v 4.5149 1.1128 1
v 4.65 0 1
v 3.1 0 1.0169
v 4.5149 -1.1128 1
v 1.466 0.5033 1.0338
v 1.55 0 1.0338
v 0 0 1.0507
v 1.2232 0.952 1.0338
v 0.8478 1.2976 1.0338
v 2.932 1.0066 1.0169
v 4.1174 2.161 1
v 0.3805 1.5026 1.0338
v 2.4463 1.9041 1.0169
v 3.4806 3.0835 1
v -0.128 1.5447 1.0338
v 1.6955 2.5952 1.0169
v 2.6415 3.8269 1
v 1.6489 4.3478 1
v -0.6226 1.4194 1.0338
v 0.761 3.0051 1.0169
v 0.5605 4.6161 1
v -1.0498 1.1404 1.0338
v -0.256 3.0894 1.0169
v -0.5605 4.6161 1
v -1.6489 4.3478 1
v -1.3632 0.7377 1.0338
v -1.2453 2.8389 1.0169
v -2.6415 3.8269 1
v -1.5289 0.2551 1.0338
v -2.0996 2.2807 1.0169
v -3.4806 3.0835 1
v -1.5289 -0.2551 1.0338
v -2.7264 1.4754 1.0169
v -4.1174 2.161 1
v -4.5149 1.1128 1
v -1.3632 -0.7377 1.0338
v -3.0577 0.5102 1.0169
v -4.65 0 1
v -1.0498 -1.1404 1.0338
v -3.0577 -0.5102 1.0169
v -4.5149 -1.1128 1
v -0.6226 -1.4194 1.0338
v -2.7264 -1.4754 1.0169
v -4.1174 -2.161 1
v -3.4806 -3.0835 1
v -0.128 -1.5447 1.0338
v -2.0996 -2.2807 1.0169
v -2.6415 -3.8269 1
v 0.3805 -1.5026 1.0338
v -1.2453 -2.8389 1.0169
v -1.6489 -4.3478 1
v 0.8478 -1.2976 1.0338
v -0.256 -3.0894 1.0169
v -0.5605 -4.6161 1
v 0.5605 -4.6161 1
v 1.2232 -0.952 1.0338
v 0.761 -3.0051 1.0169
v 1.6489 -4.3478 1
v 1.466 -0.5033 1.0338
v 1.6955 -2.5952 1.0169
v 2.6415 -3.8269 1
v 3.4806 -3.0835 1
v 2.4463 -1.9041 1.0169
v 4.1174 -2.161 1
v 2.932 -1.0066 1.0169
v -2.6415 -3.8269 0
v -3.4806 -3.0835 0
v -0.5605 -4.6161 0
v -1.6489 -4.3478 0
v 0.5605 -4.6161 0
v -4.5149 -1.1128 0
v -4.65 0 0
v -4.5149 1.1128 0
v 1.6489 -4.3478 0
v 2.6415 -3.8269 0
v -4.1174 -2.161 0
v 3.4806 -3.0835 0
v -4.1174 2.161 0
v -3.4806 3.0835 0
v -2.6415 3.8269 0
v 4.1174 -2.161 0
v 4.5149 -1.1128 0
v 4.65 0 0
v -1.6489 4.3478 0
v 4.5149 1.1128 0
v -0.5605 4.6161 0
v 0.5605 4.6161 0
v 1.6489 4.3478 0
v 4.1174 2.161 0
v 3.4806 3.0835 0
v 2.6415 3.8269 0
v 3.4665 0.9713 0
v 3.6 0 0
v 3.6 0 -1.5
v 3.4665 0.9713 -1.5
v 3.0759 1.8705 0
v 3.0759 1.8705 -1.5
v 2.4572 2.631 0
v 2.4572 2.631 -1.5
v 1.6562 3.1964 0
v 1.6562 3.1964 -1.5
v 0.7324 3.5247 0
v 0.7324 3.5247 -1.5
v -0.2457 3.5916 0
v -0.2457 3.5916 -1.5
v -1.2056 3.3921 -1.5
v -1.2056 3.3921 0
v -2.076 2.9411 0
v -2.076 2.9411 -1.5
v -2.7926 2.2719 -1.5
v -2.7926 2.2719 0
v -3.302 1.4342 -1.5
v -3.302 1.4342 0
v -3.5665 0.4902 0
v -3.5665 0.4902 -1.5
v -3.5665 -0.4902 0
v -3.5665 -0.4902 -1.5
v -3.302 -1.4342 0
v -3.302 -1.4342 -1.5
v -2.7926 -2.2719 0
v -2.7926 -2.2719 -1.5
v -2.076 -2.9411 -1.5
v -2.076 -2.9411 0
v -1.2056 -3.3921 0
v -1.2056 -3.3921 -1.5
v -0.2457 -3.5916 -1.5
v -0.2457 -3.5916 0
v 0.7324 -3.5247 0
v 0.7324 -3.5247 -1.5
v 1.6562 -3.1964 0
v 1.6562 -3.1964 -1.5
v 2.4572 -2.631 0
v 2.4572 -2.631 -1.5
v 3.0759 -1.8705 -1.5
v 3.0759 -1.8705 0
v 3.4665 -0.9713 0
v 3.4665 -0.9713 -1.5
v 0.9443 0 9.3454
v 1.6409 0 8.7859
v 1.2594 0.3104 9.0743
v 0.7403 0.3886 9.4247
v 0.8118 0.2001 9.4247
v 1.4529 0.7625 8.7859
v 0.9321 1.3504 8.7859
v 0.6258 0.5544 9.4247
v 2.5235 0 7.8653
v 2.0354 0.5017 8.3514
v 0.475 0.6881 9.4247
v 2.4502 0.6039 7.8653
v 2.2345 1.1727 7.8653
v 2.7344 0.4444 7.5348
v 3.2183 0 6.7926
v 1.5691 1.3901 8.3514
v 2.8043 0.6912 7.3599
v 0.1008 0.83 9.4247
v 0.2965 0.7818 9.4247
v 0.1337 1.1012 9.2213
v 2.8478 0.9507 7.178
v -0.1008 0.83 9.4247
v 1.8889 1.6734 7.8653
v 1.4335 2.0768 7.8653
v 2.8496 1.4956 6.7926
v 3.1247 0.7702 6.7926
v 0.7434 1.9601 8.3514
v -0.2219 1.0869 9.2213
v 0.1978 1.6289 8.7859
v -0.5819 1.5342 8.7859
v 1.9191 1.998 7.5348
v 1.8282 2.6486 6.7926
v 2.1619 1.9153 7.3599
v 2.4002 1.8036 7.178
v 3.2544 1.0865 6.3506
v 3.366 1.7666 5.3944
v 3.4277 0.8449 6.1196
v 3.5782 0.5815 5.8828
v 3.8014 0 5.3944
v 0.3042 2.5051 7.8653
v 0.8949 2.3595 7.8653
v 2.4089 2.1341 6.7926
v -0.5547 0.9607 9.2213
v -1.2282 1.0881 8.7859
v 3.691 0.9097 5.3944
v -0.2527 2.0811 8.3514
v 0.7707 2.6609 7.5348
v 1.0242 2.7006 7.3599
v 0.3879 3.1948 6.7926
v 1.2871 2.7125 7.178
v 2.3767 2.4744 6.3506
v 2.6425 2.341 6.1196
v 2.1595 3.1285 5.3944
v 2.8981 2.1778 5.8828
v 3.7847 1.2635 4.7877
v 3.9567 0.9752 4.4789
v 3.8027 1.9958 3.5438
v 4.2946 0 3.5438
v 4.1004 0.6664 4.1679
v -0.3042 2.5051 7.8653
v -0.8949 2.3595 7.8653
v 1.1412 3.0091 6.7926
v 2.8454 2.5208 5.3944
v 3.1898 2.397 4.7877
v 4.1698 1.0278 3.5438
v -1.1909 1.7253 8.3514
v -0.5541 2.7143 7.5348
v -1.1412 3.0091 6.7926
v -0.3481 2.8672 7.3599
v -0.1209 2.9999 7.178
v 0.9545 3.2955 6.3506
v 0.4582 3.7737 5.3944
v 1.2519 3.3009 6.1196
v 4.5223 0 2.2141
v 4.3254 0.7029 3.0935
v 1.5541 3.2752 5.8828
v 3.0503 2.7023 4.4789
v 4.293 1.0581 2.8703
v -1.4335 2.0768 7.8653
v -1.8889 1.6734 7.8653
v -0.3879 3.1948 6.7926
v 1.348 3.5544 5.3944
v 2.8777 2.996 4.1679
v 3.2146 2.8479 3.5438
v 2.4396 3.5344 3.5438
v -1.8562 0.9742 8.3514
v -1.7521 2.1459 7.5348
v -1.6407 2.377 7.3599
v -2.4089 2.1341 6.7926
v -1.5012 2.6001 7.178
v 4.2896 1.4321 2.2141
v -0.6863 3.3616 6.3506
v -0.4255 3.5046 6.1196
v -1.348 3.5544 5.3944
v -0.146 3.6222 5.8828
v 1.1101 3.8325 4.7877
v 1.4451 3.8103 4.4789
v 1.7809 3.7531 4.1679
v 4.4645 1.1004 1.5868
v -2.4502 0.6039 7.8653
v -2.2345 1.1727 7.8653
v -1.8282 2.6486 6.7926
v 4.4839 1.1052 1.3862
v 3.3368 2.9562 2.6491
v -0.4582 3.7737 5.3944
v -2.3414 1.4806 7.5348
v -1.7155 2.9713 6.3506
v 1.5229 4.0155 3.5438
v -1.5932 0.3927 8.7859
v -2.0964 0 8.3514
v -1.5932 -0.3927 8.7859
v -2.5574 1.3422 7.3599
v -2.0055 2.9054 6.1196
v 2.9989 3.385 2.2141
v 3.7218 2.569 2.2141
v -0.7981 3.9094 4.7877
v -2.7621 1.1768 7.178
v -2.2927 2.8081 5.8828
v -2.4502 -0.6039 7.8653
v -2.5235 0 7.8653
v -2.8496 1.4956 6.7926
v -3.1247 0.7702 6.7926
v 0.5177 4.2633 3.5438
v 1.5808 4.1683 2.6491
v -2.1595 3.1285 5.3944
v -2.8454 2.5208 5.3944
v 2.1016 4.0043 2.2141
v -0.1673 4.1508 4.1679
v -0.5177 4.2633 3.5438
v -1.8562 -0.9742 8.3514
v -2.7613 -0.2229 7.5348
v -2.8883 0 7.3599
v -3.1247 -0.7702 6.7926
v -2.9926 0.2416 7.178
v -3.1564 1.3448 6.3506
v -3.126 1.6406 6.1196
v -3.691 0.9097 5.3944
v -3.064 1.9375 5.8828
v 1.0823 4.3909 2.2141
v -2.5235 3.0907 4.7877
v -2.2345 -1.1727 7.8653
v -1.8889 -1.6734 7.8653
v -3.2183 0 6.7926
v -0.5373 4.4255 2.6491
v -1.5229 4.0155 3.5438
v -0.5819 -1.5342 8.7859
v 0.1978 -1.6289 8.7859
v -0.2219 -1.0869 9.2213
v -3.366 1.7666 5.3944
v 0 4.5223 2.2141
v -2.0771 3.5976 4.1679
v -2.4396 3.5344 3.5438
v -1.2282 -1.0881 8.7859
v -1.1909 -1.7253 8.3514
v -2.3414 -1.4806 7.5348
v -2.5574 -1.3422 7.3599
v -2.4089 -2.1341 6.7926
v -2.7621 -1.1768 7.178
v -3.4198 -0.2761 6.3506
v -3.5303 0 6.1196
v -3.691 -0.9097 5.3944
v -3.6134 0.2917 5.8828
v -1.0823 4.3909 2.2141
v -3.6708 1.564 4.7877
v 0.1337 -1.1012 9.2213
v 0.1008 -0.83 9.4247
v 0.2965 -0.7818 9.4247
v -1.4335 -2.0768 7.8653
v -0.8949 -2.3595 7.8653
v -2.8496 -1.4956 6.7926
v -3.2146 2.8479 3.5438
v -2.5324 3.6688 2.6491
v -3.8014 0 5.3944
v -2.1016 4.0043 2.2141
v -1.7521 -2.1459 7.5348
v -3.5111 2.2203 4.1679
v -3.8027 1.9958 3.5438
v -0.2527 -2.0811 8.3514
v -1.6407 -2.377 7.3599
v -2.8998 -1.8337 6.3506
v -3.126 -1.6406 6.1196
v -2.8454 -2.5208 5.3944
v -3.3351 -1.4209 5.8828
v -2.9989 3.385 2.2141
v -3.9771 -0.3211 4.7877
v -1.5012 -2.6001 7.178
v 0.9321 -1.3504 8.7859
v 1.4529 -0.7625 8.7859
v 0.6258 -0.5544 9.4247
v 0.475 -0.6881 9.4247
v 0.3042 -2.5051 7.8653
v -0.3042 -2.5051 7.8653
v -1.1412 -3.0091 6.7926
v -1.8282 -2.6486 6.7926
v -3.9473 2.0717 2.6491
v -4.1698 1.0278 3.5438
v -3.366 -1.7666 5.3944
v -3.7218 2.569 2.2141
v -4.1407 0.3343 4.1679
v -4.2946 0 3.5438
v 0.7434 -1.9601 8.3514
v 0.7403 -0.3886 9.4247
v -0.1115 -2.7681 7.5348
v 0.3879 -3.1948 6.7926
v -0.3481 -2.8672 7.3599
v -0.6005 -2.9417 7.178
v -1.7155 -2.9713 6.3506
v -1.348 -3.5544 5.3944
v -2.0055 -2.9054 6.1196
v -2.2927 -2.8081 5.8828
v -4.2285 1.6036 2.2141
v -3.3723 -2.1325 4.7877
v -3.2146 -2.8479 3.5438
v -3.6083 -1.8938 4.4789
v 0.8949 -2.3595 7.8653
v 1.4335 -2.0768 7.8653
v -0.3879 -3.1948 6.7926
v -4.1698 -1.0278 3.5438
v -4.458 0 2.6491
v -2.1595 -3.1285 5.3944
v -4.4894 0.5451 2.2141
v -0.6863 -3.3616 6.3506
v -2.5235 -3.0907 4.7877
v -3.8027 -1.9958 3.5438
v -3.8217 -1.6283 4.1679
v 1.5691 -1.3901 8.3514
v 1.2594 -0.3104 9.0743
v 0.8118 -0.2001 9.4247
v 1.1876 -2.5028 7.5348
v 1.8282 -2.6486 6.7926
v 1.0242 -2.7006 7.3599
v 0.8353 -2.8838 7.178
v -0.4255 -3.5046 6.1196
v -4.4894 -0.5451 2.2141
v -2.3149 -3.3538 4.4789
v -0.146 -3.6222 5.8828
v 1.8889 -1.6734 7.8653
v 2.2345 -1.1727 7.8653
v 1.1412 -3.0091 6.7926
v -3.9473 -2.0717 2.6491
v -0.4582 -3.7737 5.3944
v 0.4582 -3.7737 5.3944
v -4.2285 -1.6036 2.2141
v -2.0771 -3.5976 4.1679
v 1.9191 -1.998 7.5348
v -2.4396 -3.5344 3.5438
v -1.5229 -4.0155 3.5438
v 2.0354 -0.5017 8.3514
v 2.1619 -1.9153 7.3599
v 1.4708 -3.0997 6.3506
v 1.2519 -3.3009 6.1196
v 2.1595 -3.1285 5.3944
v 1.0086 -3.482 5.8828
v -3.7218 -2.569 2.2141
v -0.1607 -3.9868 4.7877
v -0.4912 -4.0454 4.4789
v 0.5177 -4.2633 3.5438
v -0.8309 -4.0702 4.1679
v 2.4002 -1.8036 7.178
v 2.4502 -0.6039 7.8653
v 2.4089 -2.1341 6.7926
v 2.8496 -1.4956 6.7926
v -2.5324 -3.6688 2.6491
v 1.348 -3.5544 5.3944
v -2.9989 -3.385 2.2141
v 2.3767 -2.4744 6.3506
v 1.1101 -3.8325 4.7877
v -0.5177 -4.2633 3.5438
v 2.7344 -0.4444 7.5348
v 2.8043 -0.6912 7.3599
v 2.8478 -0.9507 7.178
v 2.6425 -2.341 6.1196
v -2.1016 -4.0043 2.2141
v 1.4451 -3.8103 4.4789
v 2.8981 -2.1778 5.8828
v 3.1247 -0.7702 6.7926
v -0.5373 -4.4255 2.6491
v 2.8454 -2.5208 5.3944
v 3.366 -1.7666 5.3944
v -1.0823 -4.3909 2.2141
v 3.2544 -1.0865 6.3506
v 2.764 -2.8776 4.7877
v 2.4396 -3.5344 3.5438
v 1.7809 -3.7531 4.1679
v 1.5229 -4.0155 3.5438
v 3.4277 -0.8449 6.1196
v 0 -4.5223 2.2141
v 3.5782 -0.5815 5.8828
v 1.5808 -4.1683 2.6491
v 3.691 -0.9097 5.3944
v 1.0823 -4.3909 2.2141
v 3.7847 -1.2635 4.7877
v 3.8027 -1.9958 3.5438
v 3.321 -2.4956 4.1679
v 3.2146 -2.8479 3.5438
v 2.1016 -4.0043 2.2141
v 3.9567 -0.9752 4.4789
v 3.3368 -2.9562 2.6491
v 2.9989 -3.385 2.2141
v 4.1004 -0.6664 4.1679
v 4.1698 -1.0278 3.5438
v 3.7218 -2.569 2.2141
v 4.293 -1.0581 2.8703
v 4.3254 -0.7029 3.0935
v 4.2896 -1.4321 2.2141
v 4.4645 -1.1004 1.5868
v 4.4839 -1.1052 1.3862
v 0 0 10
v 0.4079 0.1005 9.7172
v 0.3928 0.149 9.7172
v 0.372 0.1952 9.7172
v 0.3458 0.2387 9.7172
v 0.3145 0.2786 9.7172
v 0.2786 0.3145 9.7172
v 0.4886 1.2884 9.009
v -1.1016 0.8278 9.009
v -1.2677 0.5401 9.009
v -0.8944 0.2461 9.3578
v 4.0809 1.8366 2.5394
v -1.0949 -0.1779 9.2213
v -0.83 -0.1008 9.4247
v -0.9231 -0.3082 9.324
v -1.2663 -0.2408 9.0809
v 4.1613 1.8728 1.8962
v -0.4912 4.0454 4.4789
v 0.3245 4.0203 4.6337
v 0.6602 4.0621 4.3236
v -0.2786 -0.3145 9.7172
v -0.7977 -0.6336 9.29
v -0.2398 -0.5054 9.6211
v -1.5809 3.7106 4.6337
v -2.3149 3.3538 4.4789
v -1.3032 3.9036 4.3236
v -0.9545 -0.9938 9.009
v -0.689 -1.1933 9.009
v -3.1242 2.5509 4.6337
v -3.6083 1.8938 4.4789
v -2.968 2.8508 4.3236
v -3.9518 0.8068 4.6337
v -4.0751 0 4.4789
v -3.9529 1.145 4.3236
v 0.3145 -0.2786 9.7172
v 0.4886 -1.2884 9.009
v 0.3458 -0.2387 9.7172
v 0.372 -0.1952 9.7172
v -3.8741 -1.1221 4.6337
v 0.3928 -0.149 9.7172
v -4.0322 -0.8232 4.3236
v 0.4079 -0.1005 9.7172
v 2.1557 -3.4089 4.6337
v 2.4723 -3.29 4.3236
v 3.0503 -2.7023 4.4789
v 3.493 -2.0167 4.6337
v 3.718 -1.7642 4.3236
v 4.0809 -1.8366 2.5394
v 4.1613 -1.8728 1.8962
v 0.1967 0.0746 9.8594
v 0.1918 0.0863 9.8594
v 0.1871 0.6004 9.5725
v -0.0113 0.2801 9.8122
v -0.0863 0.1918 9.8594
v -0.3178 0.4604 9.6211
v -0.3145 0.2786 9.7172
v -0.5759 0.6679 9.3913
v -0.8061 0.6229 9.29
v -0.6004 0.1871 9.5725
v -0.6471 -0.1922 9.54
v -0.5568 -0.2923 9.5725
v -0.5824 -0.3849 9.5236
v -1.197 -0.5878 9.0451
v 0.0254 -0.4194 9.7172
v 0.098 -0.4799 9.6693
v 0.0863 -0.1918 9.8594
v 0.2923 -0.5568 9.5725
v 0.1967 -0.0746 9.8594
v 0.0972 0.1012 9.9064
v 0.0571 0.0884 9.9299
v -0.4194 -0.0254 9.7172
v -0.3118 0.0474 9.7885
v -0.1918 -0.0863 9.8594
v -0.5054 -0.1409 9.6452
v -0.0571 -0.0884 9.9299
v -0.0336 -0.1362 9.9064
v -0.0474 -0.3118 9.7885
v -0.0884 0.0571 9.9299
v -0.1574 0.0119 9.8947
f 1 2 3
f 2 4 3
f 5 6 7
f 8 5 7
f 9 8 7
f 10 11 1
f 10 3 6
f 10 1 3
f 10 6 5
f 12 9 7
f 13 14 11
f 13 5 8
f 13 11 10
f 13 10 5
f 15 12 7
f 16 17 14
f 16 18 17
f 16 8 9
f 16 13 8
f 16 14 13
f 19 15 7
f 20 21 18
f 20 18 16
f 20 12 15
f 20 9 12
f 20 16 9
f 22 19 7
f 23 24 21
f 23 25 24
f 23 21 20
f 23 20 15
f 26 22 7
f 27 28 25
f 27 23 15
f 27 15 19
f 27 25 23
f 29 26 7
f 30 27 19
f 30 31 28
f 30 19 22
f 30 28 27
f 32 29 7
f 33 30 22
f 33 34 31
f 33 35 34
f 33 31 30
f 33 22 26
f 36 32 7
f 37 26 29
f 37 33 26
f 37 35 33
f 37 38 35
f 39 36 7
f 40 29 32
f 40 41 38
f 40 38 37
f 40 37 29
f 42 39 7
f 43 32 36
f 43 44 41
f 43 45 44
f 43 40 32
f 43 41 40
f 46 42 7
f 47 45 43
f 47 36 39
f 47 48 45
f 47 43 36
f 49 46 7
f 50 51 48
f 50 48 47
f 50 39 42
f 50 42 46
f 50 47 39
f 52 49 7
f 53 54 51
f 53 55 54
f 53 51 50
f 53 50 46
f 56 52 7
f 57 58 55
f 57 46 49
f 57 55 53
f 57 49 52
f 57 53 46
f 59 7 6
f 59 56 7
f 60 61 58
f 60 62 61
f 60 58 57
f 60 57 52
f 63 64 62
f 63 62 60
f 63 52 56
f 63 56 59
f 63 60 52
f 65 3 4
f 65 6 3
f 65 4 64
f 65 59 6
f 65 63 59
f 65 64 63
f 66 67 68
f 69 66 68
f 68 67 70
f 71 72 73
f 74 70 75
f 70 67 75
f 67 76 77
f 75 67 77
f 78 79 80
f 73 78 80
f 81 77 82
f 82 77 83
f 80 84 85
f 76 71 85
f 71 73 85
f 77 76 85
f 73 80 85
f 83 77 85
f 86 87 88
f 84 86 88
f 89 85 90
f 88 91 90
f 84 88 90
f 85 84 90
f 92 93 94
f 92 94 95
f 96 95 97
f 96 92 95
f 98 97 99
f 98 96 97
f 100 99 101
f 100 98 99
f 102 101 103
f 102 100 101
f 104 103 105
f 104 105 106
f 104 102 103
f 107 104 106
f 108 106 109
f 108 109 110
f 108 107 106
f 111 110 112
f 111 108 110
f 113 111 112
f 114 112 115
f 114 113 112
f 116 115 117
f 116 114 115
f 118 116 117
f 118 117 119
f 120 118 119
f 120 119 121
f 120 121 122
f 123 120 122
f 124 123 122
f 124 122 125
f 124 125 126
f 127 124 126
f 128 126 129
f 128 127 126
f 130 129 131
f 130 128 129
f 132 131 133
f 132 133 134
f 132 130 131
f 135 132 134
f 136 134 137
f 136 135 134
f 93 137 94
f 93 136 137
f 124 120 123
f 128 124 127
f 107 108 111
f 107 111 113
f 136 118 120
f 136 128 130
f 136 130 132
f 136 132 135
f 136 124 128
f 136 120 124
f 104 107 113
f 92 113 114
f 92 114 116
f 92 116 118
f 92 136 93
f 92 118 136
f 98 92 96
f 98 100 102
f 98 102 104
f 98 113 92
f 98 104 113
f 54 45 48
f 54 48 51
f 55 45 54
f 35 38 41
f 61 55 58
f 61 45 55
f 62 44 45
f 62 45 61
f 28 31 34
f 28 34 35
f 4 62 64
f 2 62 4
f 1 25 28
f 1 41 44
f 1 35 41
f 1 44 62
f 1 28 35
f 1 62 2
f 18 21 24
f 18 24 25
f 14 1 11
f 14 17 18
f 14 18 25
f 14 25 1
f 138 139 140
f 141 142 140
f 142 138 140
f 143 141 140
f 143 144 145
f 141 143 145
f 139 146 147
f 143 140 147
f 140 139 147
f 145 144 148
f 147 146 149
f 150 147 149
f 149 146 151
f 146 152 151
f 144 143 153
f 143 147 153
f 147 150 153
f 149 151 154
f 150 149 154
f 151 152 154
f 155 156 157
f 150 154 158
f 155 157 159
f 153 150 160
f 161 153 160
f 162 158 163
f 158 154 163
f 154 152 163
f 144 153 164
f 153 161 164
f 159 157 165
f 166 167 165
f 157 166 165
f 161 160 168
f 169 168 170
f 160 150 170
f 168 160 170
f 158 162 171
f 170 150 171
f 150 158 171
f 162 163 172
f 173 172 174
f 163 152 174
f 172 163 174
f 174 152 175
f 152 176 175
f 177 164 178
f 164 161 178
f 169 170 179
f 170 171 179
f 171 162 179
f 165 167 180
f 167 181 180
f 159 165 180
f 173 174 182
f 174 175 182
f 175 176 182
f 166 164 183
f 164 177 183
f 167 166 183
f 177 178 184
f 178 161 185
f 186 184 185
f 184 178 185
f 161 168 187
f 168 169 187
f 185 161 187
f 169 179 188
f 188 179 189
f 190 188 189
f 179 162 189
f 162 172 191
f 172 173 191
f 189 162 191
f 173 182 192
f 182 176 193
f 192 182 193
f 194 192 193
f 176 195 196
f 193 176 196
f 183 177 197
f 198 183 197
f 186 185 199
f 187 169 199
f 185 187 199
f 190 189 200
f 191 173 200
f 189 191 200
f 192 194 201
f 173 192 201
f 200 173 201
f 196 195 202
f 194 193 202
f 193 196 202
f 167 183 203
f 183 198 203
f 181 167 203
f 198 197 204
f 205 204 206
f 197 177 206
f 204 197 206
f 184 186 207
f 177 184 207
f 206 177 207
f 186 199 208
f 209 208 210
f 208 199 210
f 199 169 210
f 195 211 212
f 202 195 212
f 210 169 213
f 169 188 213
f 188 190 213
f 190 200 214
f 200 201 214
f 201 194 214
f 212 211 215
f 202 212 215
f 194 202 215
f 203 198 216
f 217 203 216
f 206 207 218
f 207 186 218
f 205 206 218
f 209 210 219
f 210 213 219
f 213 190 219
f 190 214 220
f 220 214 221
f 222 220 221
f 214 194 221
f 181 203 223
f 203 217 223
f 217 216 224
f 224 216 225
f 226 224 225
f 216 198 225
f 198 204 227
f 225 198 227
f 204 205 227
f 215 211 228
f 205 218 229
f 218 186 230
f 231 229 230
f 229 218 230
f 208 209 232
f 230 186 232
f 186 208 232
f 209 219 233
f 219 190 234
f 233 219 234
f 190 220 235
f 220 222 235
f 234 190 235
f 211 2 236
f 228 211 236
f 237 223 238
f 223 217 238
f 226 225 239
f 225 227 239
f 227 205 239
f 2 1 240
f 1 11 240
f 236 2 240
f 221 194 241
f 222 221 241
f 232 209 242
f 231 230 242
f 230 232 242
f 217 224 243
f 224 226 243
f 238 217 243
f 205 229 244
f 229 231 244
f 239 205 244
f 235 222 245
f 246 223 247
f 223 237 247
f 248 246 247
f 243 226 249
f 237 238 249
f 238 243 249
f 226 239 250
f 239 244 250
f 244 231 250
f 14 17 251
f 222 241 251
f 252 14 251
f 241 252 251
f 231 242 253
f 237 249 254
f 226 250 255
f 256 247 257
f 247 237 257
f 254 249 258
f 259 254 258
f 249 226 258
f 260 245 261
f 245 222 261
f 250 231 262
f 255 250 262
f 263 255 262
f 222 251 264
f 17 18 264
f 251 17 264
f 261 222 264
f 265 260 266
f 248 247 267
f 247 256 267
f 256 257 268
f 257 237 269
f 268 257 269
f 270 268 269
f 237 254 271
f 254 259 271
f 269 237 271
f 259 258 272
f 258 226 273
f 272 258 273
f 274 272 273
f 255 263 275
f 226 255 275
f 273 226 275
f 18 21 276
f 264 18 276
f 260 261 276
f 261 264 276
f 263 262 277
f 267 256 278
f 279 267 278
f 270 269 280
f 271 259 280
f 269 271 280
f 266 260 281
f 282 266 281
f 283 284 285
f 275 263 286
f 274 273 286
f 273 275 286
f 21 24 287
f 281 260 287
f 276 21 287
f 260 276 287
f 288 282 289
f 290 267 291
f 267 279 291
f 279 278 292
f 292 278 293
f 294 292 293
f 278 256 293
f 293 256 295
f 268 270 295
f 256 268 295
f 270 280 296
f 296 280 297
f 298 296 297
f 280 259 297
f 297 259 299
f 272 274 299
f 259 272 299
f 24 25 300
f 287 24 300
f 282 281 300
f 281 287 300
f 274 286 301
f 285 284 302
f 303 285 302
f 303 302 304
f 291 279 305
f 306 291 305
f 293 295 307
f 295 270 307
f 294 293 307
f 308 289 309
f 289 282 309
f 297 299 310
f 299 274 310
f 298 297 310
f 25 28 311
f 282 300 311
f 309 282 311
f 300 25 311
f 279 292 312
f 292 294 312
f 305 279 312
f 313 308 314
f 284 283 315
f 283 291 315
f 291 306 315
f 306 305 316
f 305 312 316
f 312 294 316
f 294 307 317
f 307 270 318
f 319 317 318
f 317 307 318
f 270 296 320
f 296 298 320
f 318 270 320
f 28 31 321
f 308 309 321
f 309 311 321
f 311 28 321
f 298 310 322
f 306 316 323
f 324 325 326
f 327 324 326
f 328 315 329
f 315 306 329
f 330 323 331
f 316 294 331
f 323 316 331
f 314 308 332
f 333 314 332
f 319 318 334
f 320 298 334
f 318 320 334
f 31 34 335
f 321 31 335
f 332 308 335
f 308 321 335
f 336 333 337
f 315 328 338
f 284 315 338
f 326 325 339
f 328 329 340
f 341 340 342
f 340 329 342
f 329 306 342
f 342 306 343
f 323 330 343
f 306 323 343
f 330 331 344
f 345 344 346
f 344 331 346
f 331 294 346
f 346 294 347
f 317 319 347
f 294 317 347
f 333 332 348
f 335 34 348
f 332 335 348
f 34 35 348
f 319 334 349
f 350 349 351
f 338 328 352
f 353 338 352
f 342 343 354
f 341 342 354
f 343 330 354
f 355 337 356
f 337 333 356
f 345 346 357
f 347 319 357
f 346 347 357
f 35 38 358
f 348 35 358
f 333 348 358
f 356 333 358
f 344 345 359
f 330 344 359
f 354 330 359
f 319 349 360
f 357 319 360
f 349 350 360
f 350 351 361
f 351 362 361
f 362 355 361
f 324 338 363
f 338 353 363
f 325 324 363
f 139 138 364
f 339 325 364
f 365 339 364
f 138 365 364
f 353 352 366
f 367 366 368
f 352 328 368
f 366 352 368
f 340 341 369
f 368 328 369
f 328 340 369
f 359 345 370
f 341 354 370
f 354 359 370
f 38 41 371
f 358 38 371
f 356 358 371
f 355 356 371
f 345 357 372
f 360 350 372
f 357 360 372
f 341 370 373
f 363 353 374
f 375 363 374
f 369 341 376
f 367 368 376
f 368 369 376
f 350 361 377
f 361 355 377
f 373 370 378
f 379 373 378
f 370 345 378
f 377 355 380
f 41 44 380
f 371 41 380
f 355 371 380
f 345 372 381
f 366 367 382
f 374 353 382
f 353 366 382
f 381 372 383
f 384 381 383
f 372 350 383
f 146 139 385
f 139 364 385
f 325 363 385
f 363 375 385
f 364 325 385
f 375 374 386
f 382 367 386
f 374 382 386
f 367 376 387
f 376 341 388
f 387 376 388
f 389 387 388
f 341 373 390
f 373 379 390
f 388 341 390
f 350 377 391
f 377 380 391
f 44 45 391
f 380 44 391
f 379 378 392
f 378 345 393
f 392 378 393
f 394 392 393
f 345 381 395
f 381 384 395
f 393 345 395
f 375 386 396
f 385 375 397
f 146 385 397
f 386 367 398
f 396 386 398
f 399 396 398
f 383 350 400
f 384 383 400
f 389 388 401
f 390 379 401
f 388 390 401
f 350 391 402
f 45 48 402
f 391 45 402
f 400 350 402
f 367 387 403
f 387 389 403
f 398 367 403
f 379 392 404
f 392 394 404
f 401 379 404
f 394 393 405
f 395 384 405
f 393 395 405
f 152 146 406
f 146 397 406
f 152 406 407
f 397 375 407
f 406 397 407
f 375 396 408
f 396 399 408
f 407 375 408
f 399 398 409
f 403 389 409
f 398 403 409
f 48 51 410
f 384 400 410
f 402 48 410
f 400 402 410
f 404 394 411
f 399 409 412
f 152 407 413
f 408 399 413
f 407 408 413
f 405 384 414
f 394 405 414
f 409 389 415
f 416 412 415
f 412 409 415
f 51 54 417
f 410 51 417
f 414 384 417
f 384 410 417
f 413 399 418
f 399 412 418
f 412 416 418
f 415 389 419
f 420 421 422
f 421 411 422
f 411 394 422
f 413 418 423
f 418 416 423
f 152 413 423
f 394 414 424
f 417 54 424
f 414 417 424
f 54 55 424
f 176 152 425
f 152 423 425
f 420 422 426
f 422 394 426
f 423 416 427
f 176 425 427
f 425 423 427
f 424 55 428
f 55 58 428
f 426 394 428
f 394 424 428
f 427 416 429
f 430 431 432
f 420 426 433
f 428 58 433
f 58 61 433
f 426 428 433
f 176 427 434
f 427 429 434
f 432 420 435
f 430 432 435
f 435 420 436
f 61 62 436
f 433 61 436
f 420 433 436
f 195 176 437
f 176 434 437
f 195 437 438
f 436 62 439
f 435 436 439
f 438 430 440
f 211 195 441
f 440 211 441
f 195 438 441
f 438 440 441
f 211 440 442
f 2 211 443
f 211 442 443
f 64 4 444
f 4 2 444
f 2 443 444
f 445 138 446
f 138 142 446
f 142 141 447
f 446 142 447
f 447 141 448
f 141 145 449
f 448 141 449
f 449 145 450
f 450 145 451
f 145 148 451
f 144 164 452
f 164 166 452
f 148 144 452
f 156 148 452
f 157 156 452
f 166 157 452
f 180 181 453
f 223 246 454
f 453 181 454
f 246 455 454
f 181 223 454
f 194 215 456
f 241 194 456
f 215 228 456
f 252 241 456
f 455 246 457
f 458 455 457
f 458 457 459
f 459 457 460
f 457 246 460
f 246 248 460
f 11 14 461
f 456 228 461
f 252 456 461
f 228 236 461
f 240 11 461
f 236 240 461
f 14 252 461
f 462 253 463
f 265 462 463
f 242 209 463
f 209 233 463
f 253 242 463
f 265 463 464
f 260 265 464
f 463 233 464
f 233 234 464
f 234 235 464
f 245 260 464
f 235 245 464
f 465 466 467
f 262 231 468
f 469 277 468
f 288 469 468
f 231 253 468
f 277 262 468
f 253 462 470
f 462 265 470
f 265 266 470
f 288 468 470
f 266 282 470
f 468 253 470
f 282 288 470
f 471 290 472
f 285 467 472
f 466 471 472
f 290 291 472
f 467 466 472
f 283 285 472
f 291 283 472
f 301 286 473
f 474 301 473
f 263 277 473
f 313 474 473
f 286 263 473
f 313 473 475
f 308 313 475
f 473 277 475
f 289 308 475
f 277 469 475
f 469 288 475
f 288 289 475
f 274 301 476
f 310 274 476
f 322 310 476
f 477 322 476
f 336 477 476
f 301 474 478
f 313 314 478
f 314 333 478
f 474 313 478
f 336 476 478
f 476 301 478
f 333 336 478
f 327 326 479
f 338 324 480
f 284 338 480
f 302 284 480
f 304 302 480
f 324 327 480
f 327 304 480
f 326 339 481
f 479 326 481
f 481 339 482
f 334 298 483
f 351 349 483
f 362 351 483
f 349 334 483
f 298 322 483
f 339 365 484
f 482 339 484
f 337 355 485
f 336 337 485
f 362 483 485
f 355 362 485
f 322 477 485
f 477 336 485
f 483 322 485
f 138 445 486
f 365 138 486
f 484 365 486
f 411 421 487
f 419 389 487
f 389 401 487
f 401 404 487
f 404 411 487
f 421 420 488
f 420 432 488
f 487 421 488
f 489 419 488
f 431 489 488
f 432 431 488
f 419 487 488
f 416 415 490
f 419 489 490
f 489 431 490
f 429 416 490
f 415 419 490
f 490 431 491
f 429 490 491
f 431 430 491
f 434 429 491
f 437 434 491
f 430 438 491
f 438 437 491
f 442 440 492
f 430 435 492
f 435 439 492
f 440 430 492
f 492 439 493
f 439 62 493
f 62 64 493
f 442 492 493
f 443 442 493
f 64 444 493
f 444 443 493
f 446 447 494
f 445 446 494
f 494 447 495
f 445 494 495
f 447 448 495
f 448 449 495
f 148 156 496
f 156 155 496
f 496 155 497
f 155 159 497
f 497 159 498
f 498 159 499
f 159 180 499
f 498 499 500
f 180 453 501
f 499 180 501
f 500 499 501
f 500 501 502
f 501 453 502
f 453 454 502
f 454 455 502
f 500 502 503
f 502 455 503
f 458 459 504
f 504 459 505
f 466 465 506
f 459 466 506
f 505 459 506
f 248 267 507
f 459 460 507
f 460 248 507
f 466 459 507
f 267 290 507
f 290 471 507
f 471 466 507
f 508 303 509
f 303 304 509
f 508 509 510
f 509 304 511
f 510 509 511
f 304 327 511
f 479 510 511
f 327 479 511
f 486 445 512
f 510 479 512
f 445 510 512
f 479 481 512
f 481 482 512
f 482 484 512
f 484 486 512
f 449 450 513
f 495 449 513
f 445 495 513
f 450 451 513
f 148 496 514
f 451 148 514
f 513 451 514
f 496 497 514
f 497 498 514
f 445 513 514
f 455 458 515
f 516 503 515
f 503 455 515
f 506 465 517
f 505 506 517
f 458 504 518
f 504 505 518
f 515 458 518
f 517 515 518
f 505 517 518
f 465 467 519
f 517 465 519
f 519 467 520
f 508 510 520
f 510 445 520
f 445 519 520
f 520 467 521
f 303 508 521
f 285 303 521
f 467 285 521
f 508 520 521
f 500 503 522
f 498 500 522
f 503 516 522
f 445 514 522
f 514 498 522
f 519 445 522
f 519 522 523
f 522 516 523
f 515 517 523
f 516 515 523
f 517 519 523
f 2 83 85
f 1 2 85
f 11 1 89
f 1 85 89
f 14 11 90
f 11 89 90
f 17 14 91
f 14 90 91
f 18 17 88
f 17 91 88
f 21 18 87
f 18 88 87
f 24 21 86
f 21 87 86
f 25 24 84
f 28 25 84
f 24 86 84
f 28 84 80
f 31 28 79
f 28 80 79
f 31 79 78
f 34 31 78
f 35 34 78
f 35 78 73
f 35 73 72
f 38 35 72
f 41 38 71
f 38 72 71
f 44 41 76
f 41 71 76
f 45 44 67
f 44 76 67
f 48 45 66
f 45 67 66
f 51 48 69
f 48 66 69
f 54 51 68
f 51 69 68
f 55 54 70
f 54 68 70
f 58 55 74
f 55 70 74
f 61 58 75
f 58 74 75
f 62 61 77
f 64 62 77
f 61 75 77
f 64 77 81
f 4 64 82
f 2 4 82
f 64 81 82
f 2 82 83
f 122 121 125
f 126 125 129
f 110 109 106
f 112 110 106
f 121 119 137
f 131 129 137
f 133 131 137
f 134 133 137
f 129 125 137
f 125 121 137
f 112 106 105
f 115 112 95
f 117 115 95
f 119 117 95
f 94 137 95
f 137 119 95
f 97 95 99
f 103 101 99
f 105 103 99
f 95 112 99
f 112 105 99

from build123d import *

# Parameters (mm, degrees)
F0_R     = 3.6
F1_DEPTH = 1.5
F0_R_2   = 4.65
F2_DEPTH = 1


with BuildPart() as f1:
    # F0 (on Top) → F1 (new body)
    with BuildSketch(Plane.XY):
        Circle(F0_R)
    extrude(amount=-F1_DEPTH)


with BuildPart() as f2:
    # F0 (on Top) → F2 (new body)
    with BuildSketch(Plane.XY):
        Circle(F0_R_2)
        Circle(F0_R, mode=Mode.SUBTRACT)
        Circle(F0_R)
    extrude(amount=F2_DEPTH)


with BuildPart() as f4:
    # F3 (on Front) → F4 (revolve)
    with BuildSketch(Plane.XZ):
        with BuildLine():
            add(Edge.make_bspline(
                [(0, 10), (1.1435414179, 9.2391139842), (3.6583657211, 7.4756786018), (4.5226199194, 2.78332867), (4.65, 1)],
                knots=[0, 0, 0, 0, 0.4527395759, 1, 1, 1, 1], degree=3))
            Line((0, 10), (0, 1.0506899562))
            Line((0, 1.0506899562), (4.65, 1))
        make_face()
    revolve(axis=Axis((0, 0, 5.5253449781), (0, 0, 1)))


solid = Compound([f1.part, f2.part, f4.part])
